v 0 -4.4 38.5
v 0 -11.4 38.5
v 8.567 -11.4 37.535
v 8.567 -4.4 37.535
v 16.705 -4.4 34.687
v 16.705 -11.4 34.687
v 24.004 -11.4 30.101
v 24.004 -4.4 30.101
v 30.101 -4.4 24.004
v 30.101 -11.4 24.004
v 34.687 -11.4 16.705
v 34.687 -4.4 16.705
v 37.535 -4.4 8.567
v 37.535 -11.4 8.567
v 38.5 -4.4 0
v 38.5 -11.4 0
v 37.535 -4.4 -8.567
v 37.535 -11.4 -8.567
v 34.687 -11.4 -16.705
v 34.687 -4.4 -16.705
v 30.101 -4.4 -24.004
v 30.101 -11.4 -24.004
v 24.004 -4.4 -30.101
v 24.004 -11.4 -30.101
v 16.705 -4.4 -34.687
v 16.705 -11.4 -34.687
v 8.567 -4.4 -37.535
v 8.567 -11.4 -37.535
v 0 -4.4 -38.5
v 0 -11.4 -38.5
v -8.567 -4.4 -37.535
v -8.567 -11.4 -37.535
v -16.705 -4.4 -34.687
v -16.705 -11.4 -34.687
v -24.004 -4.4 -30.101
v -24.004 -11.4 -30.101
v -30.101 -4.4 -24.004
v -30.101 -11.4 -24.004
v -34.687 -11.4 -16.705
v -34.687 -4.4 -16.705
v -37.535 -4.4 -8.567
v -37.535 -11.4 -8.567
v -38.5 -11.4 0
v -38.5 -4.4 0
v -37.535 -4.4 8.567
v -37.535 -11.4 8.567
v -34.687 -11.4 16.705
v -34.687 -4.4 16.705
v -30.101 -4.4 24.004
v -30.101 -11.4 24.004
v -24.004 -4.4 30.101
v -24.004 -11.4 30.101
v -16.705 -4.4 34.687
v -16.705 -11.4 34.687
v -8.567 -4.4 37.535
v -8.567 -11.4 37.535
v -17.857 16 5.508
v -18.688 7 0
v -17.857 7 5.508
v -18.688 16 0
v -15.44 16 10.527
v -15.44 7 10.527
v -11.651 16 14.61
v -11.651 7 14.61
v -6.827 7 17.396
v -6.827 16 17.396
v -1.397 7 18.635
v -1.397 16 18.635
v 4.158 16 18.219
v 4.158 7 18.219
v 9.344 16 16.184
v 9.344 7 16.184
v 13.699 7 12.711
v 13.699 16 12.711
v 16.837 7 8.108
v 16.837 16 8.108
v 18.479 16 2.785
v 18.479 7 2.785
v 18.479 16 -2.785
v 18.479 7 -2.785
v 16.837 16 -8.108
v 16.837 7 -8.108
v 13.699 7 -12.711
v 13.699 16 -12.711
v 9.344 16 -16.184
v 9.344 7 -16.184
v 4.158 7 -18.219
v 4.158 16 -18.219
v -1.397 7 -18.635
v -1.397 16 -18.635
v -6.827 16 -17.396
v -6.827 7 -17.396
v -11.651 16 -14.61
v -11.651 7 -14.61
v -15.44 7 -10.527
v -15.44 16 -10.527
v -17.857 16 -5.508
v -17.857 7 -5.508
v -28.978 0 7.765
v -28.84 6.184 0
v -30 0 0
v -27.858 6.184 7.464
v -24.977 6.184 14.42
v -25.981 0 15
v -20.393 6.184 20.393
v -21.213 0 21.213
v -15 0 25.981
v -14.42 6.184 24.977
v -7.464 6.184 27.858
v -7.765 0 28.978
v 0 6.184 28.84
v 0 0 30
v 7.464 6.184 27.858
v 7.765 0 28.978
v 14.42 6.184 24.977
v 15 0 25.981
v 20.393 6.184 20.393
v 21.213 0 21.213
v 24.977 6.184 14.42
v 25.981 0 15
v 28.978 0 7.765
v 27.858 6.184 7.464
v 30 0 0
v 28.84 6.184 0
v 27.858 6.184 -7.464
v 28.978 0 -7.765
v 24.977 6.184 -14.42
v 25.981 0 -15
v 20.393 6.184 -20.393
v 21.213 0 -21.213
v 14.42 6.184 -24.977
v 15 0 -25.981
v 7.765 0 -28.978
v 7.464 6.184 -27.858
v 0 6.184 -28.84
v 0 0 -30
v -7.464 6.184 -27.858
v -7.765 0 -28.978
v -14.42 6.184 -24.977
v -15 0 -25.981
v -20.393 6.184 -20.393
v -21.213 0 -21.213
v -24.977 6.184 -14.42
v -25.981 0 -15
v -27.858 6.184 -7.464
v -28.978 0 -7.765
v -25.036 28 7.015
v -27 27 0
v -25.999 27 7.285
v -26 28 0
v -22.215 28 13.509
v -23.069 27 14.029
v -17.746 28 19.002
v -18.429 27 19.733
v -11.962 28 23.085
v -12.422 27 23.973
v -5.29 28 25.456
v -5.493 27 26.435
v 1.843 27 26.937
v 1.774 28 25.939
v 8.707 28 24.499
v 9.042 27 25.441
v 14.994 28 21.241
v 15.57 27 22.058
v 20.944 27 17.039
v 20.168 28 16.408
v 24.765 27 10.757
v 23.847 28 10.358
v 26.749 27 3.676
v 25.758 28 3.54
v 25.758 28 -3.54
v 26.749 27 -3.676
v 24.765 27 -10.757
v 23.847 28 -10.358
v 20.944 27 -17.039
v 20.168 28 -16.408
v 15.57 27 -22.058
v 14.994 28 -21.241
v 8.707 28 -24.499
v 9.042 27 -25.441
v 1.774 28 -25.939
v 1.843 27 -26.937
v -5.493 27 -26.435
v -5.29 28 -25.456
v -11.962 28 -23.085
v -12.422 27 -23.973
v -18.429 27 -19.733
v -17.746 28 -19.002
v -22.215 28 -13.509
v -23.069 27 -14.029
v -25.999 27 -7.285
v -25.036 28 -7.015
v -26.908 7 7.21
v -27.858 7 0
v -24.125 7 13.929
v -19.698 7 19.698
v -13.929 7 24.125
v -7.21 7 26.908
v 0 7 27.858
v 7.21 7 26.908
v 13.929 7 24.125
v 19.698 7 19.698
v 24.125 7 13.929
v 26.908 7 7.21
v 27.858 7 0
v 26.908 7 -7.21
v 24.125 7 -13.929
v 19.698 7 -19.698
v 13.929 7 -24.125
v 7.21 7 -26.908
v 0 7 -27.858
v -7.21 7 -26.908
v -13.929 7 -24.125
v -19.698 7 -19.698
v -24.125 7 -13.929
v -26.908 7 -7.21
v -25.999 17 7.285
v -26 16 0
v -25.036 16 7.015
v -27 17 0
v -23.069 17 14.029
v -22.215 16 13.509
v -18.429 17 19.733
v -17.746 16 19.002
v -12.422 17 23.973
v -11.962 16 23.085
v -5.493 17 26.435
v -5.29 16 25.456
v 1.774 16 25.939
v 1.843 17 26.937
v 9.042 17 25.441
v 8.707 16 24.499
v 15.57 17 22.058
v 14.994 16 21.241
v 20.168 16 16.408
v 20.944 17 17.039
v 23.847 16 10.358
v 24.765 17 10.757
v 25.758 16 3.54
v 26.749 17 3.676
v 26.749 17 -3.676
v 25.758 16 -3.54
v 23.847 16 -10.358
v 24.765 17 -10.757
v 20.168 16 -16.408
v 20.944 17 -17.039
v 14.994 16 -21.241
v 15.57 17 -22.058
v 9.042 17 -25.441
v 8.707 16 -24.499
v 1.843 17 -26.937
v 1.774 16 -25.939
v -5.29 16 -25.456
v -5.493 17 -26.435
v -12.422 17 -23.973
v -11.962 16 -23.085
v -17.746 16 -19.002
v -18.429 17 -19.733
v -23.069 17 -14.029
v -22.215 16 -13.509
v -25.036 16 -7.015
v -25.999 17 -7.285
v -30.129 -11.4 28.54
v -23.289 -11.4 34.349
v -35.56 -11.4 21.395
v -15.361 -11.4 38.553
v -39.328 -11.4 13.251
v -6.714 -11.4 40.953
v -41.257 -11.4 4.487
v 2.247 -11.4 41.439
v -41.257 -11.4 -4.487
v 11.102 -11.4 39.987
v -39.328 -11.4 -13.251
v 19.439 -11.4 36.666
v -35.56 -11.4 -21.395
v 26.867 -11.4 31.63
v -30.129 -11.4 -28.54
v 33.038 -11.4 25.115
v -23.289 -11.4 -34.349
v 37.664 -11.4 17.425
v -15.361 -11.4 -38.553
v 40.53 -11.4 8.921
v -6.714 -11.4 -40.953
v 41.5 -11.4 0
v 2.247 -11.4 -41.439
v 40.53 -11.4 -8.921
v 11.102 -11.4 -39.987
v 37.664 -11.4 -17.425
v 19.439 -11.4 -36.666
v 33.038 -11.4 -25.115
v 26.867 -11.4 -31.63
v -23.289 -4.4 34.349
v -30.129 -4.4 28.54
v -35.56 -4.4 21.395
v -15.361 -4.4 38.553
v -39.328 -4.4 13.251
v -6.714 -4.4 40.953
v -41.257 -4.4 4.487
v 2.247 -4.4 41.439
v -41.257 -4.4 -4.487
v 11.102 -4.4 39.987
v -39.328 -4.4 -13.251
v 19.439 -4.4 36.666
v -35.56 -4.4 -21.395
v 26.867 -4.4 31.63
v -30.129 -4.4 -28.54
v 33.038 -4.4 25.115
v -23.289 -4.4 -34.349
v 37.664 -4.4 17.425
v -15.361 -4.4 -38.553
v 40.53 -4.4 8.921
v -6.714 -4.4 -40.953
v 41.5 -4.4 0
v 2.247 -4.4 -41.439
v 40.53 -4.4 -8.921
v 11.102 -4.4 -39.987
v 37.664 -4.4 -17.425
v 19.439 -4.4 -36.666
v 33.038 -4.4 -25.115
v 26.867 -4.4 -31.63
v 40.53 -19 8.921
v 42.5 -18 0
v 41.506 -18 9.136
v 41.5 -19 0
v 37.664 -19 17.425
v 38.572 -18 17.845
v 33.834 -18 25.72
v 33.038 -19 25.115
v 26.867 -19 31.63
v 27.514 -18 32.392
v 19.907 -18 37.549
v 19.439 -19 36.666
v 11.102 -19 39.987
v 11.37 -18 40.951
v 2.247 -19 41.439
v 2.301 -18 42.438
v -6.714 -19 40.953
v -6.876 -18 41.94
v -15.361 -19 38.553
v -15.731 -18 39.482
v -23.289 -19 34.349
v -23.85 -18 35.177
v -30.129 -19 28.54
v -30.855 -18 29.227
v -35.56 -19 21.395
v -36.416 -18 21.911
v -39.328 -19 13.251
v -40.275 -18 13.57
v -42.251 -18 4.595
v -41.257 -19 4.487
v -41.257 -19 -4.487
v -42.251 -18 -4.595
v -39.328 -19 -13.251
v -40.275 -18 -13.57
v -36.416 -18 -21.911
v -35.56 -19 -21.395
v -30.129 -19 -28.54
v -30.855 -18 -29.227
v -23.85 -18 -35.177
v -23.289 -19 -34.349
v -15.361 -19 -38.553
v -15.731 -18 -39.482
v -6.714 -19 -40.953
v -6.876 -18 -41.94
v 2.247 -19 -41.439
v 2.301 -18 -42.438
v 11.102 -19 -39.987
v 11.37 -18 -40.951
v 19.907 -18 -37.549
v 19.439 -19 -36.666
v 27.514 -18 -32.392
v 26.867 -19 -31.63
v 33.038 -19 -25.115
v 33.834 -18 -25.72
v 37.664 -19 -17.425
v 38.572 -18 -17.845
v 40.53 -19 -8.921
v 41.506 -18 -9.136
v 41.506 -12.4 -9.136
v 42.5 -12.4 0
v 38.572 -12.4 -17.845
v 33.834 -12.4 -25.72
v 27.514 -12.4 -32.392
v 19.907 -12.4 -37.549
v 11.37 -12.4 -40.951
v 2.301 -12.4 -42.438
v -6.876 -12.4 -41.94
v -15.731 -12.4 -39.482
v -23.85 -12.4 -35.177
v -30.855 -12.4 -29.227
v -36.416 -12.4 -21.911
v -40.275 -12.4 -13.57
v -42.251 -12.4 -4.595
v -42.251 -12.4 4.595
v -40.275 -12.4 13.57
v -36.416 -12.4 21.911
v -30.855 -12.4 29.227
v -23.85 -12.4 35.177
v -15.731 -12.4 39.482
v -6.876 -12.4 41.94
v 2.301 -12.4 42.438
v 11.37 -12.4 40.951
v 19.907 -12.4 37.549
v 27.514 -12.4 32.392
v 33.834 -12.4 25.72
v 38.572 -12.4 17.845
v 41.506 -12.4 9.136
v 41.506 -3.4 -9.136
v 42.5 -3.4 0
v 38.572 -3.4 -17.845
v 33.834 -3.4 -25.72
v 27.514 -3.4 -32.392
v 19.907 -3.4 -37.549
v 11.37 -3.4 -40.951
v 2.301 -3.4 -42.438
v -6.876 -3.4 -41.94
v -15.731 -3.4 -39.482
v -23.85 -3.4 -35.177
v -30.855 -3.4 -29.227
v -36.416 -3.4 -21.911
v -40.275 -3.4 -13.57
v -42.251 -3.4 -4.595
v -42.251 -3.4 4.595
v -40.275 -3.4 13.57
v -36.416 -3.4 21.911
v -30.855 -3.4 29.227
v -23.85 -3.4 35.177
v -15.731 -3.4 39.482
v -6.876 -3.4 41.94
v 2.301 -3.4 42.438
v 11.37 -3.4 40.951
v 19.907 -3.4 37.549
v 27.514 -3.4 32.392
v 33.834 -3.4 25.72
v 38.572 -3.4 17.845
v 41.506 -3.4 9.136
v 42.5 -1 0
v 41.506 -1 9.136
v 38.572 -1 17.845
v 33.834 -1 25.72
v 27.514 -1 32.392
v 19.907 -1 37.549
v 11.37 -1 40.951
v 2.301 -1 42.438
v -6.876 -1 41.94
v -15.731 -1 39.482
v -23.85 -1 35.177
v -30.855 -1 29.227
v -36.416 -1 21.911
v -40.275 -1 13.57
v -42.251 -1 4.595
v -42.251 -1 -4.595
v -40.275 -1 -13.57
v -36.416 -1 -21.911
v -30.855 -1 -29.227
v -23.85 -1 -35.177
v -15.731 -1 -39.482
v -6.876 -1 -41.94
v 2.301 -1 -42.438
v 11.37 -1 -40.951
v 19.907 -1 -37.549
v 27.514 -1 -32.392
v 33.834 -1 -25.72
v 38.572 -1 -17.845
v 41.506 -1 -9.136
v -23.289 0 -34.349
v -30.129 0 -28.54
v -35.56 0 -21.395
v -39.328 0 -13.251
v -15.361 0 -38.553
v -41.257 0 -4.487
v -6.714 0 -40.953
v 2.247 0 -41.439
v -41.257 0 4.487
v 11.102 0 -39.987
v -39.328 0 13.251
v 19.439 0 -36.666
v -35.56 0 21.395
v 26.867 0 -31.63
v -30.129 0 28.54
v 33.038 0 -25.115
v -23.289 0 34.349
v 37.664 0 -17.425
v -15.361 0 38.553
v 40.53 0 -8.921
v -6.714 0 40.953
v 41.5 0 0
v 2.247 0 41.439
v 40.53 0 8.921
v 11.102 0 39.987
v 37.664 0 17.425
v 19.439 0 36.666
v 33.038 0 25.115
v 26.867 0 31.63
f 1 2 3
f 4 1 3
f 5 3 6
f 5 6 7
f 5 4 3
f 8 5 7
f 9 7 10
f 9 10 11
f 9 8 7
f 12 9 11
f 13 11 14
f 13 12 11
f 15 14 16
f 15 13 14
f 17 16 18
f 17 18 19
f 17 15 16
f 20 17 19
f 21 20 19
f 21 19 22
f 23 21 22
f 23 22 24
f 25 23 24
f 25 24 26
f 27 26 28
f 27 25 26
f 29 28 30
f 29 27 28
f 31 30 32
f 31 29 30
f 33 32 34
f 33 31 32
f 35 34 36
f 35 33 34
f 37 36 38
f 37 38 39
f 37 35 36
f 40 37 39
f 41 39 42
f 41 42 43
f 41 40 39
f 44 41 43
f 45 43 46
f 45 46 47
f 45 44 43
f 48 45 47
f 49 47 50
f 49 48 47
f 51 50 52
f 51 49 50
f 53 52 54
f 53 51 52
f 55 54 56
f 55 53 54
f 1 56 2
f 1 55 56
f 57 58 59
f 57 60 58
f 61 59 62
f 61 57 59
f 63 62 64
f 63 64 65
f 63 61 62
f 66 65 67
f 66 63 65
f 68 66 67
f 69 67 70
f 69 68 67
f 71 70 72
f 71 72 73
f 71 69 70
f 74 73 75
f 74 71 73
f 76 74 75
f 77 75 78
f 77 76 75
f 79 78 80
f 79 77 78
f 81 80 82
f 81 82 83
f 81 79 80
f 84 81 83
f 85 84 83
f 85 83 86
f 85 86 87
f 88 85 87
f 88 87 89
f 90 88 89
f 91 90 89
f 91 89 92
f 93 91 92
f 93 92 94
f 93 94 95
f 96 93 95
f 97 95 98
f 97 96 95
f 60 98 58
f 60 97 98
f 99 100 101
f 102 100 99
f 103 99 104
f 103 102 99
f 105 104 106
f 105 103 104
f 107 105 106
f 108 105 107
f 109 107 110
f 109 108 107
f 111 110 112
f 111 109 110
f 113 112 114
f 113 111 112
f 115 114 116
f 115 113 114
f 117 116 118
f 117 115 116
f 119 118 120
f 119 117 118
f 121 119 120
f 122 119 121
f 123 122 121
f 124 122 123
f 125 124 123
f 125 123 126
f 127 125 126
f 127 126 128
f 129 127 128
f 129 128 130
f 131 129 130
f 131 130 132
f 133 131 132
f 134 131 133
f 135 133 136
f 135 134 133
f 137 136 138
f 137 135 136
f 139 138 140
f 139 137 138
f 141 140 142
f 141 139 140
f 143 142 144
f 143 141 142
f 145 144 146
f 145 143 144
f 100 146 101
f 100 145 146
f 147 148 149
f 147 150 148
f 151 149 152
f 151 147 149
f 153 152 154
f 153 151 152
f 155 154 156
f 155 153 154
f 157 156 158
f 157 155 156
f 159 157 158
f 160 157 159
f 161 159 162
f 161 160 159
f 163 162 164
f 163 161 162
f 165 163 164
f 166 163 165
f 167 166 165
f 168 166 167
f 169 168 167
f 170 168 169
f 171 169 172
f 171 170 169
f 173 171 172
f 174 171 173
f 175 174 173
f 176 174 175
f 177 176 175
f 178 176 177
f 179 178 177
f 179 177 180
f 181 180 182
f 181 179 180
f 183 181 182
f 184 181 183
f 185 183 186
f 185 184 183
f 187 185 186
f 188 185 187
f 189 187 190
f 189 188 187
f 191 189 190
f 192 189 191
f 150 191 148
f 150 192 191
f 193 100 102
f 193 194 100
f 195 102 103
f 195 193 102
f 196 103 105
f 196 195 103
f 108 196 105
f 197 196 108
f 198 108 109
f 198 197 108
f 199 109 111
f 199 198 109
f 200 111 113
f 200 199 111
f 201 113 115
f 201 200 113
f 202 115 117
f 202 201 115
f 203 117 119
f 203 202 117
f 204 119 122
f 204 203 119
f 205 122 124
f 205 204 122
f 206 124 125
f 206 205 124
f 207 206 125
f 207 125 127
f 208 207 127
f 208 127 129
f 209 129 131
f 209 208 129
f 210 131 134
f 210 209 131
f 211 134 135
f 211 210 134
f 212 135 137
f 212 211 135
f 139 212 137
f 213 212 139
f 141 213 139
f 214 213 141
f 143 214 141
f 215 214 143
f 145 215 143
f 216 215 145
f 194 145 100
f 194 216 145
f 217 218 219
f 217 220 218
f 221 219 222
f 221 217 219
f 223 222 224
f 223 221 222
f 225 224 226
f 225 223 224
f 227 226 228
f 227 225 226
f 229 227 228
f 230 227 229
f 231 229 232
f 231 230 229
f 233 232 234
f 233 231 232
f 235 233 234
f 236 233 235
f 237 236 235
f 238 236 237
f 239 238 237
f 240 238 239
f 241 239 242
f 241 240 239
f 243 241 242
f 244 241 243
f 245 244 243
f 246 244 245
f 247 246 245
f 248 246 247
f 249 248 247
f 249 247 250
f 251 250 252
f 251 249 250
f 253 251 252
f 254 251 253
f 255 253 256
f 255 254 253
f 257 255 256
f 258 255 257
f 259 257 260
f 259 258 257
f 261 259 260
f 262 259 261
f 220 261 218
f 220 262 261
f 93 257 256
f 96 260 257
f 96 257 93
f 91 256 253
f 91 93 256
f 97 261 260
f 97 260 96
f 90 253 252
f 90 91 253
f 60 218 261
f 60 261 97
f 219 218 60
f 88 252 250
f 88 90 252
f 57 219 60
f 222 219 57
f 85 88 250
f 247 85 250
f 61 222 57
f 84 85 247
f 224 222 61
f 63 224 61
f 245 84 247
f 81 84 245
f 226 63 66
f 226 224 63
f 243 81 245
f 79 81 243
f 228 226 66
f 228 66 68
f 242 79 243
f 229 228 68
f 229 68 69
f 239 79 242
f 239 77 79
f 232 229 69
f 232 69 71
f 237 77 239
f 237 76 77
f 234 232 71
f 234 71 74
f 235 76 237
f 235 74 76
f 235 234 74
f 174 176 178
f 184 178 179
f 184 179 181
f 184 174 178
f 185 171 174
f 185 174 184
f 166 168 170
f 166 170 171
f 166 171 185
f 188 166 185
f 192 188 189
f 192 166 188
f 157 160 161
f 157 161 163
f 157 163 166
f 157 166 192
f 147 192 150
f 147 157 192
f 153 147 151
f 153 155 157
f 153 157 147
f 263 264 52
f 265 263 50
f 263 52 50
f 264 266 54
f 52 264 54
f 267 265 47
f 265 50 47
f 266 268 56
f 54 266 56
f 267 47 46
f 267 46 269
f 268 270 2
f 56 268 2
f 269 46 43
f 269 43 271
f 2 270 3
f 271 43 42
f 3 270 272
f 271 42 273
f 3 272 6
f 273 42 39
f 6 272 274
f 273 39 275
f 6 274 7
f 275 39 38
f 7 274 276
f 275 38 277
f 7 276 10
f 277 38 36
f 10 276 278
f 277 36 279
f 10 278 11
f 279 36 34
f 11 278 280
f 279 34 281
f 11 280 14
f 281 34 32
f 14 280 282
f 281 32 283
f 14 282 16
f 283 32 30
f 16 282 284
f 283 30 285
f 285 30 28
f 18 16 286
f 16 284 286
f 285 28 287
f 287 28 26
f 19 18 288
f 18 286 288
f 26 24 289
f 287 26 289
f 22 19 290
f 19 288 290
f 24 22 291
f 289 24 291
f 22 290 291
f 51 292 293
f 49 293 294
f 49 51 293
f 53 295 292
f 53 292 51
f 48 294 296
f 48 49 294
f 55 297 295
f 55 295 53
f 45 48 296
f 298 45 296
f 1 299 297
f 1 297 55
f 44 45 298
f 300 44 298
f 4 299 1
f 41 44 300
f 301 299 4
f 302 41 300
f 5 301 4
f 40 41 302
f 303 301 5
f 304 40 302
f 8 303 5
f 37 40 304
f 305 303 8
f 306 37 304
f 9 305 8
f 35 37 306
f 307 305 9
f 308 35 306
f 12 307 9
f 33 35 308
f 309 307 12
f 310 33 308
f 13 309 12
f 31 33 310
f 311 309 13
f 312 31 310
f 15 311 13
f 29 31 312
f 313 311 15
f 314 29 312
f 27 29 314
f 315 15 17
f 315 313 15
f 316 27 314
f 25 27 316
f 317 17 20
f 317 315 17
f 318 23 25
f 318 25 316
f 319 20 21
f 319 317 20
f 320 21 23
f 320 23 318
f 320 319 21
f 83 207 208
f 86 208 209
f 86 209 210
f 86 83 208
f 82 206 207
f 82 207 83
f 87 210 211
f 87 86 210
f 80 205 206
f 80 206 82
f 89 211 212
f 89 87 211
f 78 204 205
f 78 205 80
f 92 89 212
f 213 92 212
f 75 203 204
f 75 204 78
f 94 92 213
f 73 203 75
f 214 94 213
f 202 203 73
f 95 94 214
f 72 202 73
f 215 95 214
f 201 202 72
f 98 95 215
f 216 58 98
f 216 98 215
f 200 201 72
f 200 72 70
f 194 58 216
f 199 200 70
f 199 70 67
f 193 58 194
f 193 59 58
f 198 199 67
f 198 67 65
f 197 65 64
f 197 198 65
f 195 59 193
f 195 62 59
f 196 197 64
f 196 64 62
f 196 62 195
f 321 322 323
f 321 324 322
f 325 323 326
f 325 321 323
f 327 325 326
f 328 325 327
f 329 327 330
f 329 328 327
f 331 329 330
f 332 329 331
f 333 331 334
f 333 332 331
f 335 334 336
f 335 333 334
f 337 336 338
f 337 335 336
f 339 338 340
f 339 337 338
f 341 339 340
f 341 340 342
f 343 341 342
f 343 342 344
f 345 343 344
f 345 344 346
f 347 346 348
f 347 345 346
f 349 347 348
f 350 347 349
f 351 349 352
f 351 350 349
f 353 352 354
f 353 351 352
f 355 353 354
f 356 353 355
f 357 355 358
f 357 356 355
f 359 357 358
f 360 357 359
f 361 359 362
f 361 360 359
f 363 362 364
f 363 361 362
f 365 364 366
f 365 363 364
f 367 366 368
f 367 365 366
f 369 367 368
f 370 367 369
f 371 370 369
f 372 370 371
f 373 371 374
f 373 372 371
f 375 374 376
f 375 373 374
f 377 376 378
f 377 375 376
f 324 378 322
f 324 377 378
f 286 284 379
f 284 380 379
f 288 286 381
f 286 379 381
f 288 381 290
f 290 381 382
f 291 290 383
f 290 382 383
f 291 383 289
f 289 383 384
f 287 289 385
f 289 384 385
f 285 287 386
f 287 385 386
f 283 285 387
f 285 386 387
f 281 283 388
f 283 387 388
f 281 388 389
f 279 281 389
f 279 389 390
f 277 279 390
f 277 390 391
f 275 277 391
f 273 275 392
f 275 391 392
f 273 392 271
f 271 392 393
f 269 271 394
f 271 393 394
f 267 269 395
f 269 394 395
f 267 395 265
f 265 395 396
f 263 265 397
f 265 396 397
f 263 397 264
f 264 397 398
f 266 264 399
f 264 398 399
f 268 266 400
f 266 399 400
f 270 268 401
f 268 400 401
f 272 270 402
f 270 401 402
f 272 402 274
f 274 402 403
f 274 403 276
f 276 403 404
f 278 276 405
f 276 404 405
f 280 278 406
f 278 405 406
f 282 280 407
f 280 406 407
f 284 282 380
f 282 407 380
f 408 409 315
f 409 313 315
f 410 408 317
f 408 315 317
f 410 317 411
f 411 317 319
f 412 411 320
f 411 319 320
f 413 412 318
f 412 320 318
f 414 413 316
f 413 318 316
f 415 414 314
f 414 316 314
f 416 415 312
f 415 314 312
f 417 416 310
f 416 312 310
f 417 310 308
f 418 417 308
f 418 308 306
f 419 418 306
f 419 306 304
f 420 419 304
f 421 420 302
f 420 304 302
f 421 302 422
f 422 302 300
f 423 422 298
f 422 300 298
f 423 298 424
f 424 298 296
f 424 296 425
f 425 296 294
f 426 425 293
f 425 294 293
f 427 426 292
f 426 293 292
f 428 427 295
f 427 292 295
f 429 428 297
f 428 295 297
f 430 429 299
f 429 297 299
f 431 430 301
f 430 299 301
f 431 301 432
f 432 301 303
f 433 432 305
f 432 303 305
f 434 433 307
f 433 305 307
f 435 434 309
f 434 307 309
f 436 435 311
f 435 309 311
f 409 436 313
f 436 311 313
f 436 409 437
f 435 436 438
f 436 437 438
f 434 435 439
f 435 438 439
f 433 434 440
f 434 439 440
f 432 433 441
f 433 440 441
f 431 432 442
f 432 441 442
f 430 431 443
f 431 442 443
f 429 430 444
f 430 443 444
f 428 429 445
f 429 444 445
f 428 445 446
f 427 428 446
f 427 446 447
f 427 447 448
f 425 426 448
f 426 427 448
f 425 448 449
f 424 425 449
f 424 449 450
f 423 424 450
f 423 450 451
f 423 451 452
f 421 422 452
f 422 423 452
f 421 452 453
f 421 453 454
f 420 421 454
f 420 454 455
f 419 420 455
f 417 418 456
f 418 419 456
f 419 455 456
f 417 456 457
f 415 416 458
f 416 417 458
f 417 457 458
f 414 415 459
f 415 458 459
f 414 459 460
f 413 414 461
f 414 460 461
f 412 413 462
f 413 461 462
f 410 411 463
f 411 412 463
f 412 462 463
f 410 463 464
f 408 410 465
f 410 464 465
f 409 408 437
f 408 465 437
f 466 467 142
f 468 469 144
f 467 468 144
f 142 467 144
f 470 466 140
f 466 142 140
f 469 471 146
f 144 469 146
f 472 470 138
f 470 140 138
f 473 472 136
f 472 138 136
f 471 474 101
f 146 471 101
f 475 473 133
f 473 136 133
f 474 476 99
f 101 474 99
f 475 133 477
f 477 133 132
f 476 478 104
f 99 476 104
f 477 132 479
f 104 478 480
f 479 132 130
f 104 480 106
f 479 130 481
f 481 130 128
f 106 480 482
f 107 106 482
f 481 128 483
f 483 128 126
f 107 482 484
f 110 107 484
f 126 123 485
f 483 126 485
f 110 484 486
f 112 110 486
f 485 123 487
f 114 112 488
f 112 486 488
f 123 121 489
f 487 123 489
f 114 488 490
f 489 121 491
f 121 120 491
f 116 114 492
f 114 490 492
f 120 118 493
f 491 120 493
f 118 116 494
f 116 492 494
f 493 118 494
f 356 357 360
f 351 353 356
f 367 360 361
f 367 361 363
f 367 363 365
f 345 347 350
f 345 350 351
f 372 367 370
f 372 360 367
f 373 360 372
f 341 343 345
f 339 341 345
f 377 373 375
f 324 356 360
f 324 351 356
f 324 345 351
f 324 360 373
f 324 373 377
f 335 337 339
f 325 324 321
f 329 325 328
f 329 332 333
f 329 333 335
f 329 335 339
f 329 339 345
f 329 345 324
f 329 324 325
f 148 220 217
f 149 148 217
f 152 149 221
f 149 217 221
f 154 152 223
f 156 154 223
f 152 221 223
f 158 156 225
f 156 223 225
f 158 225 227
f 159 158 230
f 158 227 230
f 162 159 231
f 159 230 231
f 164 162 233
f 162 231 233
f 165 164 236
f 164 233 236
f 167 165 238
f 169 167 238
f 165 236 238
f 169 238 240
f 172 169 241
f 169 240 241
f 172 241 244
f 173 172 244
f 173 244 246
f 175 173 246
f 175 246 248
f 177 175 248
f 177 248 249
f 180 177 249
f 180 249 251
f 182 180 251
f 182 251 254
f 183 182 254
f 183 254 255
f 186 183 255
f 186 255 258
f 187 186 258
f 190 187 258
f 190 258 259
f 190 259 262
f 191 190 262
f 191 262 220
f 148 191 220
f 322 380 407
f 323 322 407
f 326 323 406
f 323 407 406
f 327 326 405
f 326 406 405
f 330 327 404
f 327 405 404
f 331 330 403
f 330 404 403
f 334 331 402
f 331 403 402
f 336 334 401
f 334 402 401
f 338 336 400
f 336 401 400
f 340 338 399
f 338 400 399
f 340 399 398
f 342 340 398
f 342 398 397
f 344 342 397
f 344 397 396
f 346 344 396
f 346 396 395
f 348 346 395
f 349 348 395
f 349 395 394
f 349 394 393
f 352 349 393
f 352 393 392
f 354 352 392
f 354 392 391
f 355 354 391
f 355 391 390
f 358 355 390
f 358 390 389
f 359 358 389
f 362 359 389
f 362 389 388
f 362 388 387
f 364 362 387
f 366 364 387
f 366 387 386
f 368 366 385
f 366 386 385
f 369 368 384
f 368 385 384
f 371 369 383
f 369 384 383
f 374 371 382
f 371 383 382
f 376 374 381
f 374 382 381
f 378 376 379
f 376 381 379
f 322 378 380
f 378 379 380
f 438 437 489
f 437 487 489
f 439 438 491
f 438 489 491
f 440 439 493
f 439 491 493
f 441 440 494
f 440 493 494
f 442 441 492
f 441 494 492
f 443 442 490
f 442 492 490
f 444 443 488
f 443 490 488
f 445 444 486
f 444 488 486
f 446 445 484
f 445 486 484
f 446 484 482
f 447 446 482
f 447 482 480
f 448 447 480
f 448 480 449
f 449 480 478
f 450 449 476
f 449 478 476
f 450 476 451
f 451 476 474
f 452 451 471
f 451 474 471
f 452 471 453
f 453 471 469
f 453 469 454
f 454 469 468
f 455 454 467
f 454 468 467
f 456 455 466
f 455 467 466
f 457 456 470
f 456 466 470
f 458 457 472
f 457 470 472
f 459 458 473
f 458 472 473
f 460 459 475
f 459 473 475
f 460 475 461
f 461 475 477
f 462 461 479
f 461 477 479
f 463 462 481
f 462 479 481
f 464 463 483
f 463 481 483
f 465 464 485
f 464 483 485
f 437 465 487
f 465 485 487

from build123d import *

# Parameters (mm, degrees)
F0_R     = 42.5
F1_DEPTH = 19
F2_W     = 7
F2_H     = 4
F4_R     = 30
F5_DEPTH = 16
F6_R     = 27
F7_DEPTH = 12


# Not quite as in the source:
# - a fillet or chamfer that OpenCascade refuses, or shapes differently, is made with other operations: its cross-section is extruded or revolved along the edge and cut away or added


with BuildPart() as f1:
    # F0 (on Front) → F1 (new body)
    with BuildSketch(Plane.XZ):
        Circle(F0_R)
    extrude(amount=F1_DEPTH)

    # F2 (on Right) → F3 (revolve, cut)
    with BuildSketch(Plane.YZ):
        with Locations((-7.9, 40.5)):
            Rectangle(F2_W, F2_H)
    revolve(axis=Axis((0, 0, 0), (0, 1, 0)), mode=Mode.SUBTRACT)

    # F4 (on face) → F5 (join)
    with BuildSketch(Plane(origin=(0, 0, 0), x_dir=(-1, 0, 0), z_dir=(0, 1, 0))):
        Circle(F4_R)
    extrude(amount=F5_DEPTH)

    # F6 (on face) → F7 (join)
    with BuildSketch(Plane(origin=(0, 16, 0), x_dir=(-1, 0, 0), z_dir=(0, 1, 0))):
        Circle(F6_R)
    extrude(amount=F7_DEPTH)

    # F8 (on Top) → F9 (revolve, cut)
    with BuildSketch(Plane.XY):
        Polygon((-30, 16), (-30, 0), (-28.6875, 7), (-18.6875, 7), (-18.6875, 16), align=None)
    revolve(axis=Axis((0, 23.2052635401, 0), (0, 1, 0)), mode=Mode.SUBTRACT)

    # F10: chamfer of 1 on 8 edges, made by hand

    # F10_s1 → F10_t2 (revolve, cut)
    with BuildSketch(Plane.XY):
        Polygon((42.5, -3.4), (41.5, -4.4), (42.5, -4.4), align=None)
    revolve(axis=Axis((0, -4.4, 0), (0, 1, 0)), mode=Mode.SUBTRACT)

    # F10_s3 → F10_t4 (revolve, cut)
    with BuildSketch(Plane.XY):
        Polygon((41.5, -11.4), (42.5, -12.4), (42.5, -11.4), align=None)
    revolve(axis=Axis((0, -11.4, 0), (0, 1, 0)), mode=Mode.SUBTRACT)

    # F10_s5 → F10_t6 (revolve, cut)
    with BuildSketch(Plane.XY):
        Polygon((42.5, -18), (41.5, -19), (42.5, -19), align=None)
    revolve(axis=Axis((0, -19, 0), (0, -1, 0)), mode=Mode.SUBTRACT)

    # F10_s7 → F10_t8 (revolve, cut)
    with BuildSketch(Plane.XY):
        Polygon((42.5, -1), (41.5, 0), (42.5, 0), align=None)
    revolve(axis=Axis((0, 0, 0), (0, -1, 0)), mode=Mode.SUBTRACT)

    # F10_s9 → F10_t10 (revolve, cut)
    with BuildSketch(Plane.XY):
        Polygon((-28.8404458997, 6.1842885351), (-27.8575737127, 7), (-28.6875, 7), align=None)
    revolve(axis=Axis((0, 7, 0), (0, 1, 0)), mode=Mode.SUBTRACT)

    # F10_s11 → F10_t12 (revolve, cut)
    with BuildSketch(Plane.XY):
        Polygon((-26, 16), (-27, 17), (-27, 16), align=None)
    revolve(axis=Axis((0, 16, 0), (0, 1, 0)), mode=Mode.SUBTRACT)

    # F10_s13 → F10_t14 (revolve, cut)
    with BuildSketch(Plane.XY):
        Polygon((-27, 27), (-26, 28), (-27, 28), align=None)
    revolve(axis=Axis((0, 28, 0), (0, 1, 0)), mode=Mode.SUBTRACT)


solid = f1.part
